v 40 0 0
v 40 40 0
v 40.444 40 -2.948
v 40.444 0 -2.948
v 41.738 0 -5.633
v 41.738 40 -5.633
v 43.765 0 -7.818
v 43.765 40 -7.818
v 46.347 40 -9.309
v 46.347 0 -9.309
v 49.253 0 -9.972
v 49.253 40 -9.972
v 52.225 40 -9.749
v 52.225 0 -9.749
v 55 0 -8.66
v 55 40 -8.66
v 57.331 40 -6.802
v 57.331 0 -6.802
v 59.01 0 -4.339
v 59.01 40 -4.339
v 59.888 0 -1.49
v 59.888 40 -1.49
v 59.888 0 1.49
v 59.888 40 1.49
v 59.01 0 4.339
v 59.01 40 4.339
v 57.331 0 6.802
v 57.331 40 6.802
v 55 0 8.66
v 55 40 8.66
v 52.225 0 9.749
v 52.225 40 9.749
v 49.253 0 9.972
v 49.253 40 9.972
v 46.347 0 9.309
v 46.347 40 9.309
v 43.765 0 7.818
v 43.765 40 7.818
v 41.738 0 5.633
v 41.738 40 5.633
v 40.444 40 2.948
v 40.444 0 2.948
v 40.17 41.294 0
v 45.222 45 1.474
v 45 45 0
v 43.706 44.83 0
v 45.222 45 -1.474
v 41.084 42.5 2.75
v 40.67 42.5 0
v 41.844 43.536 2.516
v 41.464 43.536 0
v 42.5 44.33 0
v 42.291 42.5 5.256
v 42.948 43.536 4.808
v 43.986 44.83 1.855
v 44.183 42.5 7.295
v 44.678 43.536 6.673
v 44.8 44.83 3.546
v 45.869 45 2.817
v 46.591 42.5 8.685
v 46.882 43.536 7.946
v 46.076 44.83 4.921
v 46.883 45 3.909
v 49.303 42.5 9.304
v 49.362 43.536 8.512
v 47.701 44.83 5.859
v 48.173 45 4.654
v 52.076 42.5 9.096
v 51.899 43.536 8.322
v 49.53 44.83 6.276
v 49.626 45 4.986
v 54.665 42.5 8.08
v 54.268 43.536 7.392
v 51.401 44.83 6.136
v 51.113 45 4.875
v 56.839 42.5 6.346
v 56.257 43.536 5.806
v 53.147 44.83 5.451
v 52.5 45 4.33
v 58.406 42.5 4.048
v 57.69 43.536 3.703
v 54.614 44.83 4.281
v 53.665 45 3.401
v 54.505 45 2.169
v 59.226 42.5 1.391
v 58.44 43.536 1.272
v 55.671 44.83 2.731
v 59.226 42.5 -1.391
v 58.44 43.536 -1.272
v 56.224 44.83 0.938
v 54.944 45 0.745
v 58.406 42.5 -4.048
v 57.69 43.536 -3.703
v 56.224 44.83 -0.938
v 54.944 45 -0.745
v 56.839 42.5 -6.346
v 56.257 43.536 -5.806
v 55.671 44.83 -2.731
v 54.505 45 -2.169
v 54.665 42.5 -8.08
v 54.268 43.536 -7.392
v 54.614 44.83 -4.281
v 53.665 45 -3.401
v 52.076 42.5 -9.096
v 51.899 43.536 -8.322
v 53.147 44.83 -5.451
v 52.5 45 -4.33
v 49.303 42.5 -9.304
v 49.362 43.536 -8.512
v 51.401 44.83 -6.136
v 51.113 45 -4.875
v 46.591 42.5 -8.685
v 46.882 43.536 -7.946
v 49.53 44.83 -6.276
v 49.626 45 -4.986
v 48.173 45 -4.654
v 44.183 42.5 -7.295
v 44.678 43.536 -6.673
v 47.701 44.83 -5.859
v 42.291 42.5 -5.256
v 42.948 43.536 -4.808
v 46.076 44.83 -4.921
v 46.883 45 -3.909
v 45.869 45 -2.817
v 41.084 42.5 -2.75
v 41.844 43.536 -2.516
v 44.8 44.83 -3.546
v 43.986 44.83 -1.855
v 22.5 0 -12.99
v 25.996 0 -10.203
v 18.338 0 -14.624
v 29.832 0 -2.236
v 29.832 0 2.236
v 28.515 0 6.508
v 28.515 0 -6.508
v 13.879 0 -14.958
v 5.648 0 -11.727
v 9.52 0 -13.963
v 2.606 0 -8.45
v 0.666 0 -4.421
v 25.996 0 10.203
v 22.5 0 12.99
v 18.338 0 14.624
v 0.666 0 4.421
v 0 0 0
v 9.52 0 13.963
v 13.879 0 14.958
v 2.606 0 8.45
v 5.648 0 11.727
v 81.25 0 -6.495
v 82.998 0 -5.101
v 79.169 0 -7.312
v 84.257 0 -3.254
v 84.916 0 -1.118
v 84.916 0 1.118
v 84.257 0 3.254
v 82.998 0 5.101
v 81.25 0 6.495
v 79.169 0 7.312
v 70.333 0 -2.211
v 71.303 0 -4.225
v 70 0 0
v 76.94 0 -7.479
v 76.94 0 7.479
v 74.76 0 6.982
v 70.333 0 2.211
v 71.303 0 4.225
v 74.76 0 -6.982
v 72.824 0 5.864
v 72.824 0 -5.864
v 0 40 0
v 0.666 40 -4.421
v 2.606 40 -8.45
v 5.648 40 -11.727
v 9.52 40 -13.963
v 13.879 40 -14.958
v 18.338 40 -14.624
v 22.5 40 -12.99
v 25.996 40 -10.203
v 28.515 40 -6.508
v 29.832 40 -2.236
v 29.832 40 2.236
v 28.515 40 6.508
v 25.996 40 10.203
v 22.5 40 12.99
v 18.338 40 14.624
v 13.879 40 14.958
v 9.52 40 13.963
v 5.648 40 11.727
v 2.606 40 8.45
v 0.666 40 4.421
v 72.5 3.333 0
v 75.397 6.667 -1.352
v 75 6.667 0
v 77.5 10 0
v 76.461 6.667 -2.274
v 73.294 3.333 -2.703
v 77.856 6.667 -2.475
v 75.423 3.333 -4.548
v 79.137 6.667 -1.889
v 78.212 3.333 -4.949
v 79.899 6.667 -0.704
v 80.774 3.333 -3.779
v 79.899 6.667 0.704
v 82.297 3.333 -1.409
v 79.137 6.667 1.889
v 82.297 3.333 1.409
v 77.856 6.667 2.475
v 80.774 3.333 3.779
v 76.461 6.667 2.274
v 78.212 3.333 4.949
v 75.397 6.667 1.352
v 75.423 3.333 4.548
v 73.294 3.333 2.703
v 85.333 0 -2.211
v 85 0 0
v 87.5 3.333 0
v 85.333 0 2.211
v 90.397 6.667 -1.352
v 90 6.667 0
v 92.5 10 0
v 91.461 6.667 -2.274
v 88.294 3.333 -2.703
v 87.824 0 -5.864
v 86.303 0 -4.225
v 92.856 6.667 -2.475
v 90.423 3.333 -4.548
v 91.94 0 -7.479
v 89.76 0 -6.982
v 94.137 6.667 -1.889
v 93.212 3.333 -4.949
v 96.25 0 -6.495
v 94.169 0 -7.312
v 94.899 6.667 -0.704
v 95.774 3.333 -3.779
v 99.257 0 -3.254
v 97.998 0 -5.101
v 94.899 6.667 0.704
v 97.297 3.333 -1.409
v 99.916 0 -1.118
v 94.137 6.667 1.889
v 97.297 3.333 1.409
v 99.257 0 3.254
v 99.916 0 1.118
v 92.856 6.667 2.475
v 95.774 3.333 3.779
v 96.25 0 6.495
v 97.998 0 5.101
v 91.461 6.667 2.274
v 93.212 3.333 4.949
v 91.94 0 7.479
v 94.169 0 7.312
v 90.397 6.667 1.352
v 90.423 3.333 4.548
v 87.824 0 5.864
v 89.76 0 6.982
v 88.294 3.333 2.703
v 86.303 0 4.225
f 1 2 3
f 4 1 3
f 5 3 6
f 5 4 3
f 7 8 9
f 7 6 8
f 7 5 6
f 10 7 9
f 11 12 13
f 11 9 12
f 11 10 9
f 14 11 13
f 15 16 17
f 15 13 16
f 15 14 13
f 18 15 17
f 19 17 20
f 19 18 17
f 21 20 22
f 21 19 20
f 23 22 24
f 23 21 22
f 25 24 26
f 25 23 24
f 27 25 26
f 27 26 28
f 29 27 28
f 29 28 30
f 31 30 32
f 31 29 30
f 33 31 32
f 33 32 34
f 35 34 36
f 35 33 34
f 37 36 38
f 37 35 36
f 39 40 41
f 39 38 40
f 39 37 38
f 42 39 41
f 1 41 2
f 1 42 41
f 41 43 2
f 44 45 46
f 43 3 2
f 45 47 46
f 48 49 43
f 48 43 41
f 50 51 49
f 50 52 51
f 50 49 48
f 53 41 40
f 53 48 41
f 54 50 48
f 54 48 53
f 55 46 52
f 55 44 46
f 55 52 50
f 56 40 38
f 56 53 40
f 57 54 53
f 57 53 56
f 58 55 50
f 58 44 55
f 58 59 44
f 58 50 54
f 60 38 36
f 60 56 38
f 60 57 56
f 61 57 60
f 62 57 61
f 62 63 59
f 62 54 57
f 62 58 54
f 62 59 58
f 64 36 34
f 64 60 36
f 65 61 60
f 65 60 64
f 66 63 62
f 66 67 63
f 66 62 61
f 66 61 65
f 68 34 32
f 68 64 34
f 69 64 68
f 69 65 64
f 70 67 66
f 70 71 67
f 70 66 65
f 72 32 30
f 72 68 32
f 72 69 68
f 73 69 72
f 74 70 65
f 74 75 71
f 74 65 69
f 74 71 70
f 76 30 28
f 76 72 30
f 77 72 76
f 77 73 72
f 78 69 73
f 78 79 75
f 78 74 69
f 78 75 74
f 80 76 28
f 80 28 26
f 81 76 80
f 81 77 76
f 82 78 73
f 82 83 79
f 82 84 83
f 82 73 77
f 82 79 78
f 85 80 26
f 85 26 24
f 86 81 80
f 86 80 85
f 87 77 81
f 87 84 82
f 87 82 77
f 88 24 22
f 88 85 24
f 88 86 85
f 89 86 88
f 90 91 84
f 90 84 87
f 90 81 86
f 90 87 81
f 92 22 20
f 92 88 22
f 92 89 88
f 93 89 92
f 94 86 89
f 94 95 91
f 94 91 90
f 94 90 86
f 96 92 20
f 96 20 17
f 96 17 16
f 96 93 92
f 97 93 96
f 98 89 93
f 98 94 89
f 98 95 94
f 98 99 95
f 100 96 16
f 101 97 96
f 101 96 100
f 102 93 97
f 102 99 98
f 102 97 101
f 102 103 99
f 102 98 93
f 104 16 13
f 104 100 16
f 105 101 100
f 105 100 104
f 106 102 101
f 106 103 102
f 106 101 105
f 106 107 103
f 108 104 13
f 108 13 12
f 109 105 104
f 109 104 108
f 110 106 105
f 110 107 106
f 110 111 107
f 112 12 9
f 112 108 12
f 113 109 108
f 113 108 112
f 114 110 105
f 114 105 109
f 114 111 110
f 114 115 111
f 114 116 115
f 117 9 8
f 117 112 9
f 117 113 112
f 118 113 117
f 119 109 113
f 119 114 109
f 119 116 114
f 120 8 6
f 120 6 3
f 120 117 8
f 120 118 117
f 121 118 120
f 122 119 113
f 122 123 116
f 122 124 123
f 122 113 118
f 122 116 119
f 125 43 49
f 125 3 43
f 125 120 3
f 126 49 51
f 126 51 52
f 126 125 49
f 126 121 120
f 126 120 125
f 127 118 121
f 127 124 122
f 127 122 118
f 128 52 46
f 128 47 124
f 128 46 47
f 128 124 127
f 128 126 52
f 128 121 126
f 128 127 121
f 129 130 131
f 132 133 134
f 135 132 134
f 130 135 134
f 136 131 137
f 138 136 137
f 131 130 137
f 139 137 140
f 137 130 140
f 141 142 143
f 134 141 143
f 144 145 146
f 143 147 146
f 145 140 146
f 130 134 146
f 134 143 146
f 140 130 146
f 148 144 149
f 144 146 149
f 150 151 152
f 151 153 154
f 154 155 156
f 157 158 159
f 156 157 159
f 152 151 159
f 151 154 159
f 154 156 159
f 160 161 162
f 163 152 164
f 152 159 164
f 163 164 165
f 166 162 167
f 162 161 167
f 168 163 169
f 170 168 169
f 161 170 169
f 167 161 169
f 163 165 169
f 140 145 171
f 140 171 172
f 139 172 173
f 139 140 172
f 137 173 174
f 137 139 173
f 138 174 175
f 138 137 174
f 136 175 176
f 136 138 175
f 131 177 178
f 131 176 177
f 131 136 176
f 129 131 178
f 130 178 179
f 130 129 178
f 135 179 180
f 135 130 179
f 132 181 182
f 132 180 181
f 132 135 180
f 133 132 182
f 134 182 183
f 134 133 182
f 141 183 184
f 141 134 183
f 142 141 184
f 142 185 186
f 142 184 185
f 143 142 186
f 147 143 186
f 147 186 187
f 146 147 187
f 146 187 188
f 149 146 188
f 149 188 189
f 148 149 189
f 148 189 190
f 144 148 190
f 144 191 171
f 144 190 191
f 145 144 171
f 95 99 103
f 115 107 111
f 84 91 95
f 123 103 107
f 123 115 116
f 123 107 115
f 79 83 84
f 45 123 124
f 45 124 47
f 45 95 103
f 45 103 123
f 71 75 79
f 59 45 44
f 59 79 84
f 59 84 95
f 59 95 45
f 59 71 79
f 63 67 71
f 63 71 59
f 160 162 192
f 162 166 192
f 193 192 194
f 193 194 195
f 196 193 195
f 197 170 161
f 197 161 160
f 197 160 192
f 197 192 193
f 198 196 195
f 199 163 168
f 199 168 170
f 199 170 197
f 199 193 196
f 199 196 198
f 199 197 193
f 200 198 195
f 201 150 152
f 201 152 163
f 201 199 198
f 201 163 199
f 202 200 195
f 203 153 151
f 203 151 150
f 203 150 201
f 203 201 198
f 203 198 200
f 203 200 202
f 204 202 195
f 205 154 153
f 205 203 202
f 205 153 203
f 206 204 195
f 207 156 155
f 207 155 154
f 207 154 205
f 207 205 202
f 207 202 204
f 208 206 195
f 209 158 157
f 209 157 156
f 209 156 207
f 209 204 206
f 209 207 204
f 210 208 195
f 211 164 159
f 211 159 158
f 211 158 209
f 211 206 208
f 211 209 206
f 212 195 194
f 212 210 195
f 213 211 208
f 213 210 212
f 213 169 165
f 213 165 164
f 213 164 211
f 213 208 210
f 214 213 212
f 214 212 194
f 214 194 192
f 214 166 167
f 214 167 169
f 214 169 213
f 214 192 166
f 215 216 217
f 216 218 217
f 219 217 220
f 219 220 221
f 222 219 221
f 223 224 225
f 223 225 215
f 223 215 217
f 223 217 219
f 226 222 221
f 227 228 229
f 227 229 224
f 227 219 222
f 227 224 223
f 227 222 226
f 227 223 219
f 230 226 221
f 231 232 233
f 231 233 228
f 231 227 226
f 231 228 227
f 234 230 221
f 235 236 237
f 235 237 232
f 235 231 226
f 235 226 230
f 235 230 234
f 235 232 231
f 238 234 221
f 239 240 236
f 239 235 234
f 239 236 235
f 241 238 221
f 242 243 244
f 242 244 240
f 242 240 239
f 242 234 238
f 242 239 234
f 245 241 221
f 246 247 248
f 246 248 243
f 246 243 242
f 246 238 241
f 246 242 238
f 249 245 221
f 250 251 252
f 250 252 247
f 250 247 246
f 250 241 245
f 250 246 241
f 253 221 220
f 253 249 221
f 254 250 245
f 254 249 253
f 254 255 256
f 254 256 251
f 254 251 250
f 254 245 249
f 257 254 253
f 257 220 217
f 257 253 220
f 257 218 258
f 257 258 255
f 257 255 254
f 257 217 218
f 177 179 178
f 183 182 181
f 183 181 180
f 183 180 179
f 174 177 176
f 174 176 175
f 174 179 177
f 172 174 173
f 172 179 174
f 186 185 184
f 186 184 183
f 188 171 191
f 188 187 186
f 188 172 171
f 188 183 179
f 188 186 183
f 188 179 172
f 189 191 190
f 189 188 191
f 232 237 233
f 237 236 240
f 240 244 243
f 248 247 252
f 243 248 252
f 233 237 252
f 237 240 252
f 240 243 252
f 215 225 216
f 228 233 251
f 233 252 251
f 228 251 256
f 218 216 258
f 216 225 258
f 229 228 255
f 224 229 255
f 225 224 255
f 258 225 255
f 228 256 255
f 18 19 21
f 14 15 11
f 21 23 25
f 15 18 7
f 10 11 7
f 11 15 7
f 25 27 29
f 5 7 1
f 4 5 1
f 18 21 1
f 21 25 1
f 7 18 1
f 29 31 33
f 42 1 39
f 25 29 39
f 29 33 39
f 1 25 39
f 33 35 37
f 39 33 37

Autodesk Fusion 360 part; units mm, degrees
sketch "스케치1" plane through (0, 0, 0) normal (0, 0, 1) x (1, 0, 0)
  line L0 (0, 0) -> (15, 0)
  line L1 (15, 0) -> (15, 40)
  line L2 (15, 40) -> (0, 40)
  line L3 (0, 40) -> (0, 0)
  line L4 (40, 0) -> (50, 0)
  line L5 (50, 0) -> (50, 45)
  line L6 (50, 45) -> (40, 45)
  line L7 (40, 45) -> (40, 0)
  line L8 (70, 0) -> (85, 0)
  line L9 (85, 0) -> (100, 0)
  line L10 (77.5, 0) -> (77.5, 10)
  line L11 (92.5, 0) -> (92.5, 10)
  line L12 (70, 0) -> (77.5, 10)
  line L13 (77.5, 10) -> (85, 0)
  line L14 (85, 0) -> (92.5, 10)
  line L15 (92.5, 10) -> (100, 0)
  line L16 (85, 0) -> (85, -2)
  dimension "d1" = 15
  dimension "d2" = 40
  dimension "d3" = 10
  dimension "d4" = 45
  dimension "d5" = 15
  dimension "d6" = 15
revolve "회전1" add sketch "스케치1" angle 360 about axis through (15, 0, 0) along (0, 1, 0) contours L0 L1 L2 L3 makes body 1
revolve "회전2" add sketch "스케치1" angle 360 about axis through (50, 0, 0) along (0, 1, 0) separate body contours L4 L5 L6 L7 makes body 2
revolve "회전3" add sketch "스케치1" angle 360 about axis through (77.5, 0, 0) along (0, 1, 0) separate body contours L8 L10 L12 makes body 3
revolve "회전4" add sketch "스케치1" angle 360 about axis through (92.5, 0, 0) along (0, 1, 0) separate body contours L9 L11 L14 makes body 4
fillet "필렛1" radius 5 1 edges at (40.6767, 45, 3.6162) on bodies 2
